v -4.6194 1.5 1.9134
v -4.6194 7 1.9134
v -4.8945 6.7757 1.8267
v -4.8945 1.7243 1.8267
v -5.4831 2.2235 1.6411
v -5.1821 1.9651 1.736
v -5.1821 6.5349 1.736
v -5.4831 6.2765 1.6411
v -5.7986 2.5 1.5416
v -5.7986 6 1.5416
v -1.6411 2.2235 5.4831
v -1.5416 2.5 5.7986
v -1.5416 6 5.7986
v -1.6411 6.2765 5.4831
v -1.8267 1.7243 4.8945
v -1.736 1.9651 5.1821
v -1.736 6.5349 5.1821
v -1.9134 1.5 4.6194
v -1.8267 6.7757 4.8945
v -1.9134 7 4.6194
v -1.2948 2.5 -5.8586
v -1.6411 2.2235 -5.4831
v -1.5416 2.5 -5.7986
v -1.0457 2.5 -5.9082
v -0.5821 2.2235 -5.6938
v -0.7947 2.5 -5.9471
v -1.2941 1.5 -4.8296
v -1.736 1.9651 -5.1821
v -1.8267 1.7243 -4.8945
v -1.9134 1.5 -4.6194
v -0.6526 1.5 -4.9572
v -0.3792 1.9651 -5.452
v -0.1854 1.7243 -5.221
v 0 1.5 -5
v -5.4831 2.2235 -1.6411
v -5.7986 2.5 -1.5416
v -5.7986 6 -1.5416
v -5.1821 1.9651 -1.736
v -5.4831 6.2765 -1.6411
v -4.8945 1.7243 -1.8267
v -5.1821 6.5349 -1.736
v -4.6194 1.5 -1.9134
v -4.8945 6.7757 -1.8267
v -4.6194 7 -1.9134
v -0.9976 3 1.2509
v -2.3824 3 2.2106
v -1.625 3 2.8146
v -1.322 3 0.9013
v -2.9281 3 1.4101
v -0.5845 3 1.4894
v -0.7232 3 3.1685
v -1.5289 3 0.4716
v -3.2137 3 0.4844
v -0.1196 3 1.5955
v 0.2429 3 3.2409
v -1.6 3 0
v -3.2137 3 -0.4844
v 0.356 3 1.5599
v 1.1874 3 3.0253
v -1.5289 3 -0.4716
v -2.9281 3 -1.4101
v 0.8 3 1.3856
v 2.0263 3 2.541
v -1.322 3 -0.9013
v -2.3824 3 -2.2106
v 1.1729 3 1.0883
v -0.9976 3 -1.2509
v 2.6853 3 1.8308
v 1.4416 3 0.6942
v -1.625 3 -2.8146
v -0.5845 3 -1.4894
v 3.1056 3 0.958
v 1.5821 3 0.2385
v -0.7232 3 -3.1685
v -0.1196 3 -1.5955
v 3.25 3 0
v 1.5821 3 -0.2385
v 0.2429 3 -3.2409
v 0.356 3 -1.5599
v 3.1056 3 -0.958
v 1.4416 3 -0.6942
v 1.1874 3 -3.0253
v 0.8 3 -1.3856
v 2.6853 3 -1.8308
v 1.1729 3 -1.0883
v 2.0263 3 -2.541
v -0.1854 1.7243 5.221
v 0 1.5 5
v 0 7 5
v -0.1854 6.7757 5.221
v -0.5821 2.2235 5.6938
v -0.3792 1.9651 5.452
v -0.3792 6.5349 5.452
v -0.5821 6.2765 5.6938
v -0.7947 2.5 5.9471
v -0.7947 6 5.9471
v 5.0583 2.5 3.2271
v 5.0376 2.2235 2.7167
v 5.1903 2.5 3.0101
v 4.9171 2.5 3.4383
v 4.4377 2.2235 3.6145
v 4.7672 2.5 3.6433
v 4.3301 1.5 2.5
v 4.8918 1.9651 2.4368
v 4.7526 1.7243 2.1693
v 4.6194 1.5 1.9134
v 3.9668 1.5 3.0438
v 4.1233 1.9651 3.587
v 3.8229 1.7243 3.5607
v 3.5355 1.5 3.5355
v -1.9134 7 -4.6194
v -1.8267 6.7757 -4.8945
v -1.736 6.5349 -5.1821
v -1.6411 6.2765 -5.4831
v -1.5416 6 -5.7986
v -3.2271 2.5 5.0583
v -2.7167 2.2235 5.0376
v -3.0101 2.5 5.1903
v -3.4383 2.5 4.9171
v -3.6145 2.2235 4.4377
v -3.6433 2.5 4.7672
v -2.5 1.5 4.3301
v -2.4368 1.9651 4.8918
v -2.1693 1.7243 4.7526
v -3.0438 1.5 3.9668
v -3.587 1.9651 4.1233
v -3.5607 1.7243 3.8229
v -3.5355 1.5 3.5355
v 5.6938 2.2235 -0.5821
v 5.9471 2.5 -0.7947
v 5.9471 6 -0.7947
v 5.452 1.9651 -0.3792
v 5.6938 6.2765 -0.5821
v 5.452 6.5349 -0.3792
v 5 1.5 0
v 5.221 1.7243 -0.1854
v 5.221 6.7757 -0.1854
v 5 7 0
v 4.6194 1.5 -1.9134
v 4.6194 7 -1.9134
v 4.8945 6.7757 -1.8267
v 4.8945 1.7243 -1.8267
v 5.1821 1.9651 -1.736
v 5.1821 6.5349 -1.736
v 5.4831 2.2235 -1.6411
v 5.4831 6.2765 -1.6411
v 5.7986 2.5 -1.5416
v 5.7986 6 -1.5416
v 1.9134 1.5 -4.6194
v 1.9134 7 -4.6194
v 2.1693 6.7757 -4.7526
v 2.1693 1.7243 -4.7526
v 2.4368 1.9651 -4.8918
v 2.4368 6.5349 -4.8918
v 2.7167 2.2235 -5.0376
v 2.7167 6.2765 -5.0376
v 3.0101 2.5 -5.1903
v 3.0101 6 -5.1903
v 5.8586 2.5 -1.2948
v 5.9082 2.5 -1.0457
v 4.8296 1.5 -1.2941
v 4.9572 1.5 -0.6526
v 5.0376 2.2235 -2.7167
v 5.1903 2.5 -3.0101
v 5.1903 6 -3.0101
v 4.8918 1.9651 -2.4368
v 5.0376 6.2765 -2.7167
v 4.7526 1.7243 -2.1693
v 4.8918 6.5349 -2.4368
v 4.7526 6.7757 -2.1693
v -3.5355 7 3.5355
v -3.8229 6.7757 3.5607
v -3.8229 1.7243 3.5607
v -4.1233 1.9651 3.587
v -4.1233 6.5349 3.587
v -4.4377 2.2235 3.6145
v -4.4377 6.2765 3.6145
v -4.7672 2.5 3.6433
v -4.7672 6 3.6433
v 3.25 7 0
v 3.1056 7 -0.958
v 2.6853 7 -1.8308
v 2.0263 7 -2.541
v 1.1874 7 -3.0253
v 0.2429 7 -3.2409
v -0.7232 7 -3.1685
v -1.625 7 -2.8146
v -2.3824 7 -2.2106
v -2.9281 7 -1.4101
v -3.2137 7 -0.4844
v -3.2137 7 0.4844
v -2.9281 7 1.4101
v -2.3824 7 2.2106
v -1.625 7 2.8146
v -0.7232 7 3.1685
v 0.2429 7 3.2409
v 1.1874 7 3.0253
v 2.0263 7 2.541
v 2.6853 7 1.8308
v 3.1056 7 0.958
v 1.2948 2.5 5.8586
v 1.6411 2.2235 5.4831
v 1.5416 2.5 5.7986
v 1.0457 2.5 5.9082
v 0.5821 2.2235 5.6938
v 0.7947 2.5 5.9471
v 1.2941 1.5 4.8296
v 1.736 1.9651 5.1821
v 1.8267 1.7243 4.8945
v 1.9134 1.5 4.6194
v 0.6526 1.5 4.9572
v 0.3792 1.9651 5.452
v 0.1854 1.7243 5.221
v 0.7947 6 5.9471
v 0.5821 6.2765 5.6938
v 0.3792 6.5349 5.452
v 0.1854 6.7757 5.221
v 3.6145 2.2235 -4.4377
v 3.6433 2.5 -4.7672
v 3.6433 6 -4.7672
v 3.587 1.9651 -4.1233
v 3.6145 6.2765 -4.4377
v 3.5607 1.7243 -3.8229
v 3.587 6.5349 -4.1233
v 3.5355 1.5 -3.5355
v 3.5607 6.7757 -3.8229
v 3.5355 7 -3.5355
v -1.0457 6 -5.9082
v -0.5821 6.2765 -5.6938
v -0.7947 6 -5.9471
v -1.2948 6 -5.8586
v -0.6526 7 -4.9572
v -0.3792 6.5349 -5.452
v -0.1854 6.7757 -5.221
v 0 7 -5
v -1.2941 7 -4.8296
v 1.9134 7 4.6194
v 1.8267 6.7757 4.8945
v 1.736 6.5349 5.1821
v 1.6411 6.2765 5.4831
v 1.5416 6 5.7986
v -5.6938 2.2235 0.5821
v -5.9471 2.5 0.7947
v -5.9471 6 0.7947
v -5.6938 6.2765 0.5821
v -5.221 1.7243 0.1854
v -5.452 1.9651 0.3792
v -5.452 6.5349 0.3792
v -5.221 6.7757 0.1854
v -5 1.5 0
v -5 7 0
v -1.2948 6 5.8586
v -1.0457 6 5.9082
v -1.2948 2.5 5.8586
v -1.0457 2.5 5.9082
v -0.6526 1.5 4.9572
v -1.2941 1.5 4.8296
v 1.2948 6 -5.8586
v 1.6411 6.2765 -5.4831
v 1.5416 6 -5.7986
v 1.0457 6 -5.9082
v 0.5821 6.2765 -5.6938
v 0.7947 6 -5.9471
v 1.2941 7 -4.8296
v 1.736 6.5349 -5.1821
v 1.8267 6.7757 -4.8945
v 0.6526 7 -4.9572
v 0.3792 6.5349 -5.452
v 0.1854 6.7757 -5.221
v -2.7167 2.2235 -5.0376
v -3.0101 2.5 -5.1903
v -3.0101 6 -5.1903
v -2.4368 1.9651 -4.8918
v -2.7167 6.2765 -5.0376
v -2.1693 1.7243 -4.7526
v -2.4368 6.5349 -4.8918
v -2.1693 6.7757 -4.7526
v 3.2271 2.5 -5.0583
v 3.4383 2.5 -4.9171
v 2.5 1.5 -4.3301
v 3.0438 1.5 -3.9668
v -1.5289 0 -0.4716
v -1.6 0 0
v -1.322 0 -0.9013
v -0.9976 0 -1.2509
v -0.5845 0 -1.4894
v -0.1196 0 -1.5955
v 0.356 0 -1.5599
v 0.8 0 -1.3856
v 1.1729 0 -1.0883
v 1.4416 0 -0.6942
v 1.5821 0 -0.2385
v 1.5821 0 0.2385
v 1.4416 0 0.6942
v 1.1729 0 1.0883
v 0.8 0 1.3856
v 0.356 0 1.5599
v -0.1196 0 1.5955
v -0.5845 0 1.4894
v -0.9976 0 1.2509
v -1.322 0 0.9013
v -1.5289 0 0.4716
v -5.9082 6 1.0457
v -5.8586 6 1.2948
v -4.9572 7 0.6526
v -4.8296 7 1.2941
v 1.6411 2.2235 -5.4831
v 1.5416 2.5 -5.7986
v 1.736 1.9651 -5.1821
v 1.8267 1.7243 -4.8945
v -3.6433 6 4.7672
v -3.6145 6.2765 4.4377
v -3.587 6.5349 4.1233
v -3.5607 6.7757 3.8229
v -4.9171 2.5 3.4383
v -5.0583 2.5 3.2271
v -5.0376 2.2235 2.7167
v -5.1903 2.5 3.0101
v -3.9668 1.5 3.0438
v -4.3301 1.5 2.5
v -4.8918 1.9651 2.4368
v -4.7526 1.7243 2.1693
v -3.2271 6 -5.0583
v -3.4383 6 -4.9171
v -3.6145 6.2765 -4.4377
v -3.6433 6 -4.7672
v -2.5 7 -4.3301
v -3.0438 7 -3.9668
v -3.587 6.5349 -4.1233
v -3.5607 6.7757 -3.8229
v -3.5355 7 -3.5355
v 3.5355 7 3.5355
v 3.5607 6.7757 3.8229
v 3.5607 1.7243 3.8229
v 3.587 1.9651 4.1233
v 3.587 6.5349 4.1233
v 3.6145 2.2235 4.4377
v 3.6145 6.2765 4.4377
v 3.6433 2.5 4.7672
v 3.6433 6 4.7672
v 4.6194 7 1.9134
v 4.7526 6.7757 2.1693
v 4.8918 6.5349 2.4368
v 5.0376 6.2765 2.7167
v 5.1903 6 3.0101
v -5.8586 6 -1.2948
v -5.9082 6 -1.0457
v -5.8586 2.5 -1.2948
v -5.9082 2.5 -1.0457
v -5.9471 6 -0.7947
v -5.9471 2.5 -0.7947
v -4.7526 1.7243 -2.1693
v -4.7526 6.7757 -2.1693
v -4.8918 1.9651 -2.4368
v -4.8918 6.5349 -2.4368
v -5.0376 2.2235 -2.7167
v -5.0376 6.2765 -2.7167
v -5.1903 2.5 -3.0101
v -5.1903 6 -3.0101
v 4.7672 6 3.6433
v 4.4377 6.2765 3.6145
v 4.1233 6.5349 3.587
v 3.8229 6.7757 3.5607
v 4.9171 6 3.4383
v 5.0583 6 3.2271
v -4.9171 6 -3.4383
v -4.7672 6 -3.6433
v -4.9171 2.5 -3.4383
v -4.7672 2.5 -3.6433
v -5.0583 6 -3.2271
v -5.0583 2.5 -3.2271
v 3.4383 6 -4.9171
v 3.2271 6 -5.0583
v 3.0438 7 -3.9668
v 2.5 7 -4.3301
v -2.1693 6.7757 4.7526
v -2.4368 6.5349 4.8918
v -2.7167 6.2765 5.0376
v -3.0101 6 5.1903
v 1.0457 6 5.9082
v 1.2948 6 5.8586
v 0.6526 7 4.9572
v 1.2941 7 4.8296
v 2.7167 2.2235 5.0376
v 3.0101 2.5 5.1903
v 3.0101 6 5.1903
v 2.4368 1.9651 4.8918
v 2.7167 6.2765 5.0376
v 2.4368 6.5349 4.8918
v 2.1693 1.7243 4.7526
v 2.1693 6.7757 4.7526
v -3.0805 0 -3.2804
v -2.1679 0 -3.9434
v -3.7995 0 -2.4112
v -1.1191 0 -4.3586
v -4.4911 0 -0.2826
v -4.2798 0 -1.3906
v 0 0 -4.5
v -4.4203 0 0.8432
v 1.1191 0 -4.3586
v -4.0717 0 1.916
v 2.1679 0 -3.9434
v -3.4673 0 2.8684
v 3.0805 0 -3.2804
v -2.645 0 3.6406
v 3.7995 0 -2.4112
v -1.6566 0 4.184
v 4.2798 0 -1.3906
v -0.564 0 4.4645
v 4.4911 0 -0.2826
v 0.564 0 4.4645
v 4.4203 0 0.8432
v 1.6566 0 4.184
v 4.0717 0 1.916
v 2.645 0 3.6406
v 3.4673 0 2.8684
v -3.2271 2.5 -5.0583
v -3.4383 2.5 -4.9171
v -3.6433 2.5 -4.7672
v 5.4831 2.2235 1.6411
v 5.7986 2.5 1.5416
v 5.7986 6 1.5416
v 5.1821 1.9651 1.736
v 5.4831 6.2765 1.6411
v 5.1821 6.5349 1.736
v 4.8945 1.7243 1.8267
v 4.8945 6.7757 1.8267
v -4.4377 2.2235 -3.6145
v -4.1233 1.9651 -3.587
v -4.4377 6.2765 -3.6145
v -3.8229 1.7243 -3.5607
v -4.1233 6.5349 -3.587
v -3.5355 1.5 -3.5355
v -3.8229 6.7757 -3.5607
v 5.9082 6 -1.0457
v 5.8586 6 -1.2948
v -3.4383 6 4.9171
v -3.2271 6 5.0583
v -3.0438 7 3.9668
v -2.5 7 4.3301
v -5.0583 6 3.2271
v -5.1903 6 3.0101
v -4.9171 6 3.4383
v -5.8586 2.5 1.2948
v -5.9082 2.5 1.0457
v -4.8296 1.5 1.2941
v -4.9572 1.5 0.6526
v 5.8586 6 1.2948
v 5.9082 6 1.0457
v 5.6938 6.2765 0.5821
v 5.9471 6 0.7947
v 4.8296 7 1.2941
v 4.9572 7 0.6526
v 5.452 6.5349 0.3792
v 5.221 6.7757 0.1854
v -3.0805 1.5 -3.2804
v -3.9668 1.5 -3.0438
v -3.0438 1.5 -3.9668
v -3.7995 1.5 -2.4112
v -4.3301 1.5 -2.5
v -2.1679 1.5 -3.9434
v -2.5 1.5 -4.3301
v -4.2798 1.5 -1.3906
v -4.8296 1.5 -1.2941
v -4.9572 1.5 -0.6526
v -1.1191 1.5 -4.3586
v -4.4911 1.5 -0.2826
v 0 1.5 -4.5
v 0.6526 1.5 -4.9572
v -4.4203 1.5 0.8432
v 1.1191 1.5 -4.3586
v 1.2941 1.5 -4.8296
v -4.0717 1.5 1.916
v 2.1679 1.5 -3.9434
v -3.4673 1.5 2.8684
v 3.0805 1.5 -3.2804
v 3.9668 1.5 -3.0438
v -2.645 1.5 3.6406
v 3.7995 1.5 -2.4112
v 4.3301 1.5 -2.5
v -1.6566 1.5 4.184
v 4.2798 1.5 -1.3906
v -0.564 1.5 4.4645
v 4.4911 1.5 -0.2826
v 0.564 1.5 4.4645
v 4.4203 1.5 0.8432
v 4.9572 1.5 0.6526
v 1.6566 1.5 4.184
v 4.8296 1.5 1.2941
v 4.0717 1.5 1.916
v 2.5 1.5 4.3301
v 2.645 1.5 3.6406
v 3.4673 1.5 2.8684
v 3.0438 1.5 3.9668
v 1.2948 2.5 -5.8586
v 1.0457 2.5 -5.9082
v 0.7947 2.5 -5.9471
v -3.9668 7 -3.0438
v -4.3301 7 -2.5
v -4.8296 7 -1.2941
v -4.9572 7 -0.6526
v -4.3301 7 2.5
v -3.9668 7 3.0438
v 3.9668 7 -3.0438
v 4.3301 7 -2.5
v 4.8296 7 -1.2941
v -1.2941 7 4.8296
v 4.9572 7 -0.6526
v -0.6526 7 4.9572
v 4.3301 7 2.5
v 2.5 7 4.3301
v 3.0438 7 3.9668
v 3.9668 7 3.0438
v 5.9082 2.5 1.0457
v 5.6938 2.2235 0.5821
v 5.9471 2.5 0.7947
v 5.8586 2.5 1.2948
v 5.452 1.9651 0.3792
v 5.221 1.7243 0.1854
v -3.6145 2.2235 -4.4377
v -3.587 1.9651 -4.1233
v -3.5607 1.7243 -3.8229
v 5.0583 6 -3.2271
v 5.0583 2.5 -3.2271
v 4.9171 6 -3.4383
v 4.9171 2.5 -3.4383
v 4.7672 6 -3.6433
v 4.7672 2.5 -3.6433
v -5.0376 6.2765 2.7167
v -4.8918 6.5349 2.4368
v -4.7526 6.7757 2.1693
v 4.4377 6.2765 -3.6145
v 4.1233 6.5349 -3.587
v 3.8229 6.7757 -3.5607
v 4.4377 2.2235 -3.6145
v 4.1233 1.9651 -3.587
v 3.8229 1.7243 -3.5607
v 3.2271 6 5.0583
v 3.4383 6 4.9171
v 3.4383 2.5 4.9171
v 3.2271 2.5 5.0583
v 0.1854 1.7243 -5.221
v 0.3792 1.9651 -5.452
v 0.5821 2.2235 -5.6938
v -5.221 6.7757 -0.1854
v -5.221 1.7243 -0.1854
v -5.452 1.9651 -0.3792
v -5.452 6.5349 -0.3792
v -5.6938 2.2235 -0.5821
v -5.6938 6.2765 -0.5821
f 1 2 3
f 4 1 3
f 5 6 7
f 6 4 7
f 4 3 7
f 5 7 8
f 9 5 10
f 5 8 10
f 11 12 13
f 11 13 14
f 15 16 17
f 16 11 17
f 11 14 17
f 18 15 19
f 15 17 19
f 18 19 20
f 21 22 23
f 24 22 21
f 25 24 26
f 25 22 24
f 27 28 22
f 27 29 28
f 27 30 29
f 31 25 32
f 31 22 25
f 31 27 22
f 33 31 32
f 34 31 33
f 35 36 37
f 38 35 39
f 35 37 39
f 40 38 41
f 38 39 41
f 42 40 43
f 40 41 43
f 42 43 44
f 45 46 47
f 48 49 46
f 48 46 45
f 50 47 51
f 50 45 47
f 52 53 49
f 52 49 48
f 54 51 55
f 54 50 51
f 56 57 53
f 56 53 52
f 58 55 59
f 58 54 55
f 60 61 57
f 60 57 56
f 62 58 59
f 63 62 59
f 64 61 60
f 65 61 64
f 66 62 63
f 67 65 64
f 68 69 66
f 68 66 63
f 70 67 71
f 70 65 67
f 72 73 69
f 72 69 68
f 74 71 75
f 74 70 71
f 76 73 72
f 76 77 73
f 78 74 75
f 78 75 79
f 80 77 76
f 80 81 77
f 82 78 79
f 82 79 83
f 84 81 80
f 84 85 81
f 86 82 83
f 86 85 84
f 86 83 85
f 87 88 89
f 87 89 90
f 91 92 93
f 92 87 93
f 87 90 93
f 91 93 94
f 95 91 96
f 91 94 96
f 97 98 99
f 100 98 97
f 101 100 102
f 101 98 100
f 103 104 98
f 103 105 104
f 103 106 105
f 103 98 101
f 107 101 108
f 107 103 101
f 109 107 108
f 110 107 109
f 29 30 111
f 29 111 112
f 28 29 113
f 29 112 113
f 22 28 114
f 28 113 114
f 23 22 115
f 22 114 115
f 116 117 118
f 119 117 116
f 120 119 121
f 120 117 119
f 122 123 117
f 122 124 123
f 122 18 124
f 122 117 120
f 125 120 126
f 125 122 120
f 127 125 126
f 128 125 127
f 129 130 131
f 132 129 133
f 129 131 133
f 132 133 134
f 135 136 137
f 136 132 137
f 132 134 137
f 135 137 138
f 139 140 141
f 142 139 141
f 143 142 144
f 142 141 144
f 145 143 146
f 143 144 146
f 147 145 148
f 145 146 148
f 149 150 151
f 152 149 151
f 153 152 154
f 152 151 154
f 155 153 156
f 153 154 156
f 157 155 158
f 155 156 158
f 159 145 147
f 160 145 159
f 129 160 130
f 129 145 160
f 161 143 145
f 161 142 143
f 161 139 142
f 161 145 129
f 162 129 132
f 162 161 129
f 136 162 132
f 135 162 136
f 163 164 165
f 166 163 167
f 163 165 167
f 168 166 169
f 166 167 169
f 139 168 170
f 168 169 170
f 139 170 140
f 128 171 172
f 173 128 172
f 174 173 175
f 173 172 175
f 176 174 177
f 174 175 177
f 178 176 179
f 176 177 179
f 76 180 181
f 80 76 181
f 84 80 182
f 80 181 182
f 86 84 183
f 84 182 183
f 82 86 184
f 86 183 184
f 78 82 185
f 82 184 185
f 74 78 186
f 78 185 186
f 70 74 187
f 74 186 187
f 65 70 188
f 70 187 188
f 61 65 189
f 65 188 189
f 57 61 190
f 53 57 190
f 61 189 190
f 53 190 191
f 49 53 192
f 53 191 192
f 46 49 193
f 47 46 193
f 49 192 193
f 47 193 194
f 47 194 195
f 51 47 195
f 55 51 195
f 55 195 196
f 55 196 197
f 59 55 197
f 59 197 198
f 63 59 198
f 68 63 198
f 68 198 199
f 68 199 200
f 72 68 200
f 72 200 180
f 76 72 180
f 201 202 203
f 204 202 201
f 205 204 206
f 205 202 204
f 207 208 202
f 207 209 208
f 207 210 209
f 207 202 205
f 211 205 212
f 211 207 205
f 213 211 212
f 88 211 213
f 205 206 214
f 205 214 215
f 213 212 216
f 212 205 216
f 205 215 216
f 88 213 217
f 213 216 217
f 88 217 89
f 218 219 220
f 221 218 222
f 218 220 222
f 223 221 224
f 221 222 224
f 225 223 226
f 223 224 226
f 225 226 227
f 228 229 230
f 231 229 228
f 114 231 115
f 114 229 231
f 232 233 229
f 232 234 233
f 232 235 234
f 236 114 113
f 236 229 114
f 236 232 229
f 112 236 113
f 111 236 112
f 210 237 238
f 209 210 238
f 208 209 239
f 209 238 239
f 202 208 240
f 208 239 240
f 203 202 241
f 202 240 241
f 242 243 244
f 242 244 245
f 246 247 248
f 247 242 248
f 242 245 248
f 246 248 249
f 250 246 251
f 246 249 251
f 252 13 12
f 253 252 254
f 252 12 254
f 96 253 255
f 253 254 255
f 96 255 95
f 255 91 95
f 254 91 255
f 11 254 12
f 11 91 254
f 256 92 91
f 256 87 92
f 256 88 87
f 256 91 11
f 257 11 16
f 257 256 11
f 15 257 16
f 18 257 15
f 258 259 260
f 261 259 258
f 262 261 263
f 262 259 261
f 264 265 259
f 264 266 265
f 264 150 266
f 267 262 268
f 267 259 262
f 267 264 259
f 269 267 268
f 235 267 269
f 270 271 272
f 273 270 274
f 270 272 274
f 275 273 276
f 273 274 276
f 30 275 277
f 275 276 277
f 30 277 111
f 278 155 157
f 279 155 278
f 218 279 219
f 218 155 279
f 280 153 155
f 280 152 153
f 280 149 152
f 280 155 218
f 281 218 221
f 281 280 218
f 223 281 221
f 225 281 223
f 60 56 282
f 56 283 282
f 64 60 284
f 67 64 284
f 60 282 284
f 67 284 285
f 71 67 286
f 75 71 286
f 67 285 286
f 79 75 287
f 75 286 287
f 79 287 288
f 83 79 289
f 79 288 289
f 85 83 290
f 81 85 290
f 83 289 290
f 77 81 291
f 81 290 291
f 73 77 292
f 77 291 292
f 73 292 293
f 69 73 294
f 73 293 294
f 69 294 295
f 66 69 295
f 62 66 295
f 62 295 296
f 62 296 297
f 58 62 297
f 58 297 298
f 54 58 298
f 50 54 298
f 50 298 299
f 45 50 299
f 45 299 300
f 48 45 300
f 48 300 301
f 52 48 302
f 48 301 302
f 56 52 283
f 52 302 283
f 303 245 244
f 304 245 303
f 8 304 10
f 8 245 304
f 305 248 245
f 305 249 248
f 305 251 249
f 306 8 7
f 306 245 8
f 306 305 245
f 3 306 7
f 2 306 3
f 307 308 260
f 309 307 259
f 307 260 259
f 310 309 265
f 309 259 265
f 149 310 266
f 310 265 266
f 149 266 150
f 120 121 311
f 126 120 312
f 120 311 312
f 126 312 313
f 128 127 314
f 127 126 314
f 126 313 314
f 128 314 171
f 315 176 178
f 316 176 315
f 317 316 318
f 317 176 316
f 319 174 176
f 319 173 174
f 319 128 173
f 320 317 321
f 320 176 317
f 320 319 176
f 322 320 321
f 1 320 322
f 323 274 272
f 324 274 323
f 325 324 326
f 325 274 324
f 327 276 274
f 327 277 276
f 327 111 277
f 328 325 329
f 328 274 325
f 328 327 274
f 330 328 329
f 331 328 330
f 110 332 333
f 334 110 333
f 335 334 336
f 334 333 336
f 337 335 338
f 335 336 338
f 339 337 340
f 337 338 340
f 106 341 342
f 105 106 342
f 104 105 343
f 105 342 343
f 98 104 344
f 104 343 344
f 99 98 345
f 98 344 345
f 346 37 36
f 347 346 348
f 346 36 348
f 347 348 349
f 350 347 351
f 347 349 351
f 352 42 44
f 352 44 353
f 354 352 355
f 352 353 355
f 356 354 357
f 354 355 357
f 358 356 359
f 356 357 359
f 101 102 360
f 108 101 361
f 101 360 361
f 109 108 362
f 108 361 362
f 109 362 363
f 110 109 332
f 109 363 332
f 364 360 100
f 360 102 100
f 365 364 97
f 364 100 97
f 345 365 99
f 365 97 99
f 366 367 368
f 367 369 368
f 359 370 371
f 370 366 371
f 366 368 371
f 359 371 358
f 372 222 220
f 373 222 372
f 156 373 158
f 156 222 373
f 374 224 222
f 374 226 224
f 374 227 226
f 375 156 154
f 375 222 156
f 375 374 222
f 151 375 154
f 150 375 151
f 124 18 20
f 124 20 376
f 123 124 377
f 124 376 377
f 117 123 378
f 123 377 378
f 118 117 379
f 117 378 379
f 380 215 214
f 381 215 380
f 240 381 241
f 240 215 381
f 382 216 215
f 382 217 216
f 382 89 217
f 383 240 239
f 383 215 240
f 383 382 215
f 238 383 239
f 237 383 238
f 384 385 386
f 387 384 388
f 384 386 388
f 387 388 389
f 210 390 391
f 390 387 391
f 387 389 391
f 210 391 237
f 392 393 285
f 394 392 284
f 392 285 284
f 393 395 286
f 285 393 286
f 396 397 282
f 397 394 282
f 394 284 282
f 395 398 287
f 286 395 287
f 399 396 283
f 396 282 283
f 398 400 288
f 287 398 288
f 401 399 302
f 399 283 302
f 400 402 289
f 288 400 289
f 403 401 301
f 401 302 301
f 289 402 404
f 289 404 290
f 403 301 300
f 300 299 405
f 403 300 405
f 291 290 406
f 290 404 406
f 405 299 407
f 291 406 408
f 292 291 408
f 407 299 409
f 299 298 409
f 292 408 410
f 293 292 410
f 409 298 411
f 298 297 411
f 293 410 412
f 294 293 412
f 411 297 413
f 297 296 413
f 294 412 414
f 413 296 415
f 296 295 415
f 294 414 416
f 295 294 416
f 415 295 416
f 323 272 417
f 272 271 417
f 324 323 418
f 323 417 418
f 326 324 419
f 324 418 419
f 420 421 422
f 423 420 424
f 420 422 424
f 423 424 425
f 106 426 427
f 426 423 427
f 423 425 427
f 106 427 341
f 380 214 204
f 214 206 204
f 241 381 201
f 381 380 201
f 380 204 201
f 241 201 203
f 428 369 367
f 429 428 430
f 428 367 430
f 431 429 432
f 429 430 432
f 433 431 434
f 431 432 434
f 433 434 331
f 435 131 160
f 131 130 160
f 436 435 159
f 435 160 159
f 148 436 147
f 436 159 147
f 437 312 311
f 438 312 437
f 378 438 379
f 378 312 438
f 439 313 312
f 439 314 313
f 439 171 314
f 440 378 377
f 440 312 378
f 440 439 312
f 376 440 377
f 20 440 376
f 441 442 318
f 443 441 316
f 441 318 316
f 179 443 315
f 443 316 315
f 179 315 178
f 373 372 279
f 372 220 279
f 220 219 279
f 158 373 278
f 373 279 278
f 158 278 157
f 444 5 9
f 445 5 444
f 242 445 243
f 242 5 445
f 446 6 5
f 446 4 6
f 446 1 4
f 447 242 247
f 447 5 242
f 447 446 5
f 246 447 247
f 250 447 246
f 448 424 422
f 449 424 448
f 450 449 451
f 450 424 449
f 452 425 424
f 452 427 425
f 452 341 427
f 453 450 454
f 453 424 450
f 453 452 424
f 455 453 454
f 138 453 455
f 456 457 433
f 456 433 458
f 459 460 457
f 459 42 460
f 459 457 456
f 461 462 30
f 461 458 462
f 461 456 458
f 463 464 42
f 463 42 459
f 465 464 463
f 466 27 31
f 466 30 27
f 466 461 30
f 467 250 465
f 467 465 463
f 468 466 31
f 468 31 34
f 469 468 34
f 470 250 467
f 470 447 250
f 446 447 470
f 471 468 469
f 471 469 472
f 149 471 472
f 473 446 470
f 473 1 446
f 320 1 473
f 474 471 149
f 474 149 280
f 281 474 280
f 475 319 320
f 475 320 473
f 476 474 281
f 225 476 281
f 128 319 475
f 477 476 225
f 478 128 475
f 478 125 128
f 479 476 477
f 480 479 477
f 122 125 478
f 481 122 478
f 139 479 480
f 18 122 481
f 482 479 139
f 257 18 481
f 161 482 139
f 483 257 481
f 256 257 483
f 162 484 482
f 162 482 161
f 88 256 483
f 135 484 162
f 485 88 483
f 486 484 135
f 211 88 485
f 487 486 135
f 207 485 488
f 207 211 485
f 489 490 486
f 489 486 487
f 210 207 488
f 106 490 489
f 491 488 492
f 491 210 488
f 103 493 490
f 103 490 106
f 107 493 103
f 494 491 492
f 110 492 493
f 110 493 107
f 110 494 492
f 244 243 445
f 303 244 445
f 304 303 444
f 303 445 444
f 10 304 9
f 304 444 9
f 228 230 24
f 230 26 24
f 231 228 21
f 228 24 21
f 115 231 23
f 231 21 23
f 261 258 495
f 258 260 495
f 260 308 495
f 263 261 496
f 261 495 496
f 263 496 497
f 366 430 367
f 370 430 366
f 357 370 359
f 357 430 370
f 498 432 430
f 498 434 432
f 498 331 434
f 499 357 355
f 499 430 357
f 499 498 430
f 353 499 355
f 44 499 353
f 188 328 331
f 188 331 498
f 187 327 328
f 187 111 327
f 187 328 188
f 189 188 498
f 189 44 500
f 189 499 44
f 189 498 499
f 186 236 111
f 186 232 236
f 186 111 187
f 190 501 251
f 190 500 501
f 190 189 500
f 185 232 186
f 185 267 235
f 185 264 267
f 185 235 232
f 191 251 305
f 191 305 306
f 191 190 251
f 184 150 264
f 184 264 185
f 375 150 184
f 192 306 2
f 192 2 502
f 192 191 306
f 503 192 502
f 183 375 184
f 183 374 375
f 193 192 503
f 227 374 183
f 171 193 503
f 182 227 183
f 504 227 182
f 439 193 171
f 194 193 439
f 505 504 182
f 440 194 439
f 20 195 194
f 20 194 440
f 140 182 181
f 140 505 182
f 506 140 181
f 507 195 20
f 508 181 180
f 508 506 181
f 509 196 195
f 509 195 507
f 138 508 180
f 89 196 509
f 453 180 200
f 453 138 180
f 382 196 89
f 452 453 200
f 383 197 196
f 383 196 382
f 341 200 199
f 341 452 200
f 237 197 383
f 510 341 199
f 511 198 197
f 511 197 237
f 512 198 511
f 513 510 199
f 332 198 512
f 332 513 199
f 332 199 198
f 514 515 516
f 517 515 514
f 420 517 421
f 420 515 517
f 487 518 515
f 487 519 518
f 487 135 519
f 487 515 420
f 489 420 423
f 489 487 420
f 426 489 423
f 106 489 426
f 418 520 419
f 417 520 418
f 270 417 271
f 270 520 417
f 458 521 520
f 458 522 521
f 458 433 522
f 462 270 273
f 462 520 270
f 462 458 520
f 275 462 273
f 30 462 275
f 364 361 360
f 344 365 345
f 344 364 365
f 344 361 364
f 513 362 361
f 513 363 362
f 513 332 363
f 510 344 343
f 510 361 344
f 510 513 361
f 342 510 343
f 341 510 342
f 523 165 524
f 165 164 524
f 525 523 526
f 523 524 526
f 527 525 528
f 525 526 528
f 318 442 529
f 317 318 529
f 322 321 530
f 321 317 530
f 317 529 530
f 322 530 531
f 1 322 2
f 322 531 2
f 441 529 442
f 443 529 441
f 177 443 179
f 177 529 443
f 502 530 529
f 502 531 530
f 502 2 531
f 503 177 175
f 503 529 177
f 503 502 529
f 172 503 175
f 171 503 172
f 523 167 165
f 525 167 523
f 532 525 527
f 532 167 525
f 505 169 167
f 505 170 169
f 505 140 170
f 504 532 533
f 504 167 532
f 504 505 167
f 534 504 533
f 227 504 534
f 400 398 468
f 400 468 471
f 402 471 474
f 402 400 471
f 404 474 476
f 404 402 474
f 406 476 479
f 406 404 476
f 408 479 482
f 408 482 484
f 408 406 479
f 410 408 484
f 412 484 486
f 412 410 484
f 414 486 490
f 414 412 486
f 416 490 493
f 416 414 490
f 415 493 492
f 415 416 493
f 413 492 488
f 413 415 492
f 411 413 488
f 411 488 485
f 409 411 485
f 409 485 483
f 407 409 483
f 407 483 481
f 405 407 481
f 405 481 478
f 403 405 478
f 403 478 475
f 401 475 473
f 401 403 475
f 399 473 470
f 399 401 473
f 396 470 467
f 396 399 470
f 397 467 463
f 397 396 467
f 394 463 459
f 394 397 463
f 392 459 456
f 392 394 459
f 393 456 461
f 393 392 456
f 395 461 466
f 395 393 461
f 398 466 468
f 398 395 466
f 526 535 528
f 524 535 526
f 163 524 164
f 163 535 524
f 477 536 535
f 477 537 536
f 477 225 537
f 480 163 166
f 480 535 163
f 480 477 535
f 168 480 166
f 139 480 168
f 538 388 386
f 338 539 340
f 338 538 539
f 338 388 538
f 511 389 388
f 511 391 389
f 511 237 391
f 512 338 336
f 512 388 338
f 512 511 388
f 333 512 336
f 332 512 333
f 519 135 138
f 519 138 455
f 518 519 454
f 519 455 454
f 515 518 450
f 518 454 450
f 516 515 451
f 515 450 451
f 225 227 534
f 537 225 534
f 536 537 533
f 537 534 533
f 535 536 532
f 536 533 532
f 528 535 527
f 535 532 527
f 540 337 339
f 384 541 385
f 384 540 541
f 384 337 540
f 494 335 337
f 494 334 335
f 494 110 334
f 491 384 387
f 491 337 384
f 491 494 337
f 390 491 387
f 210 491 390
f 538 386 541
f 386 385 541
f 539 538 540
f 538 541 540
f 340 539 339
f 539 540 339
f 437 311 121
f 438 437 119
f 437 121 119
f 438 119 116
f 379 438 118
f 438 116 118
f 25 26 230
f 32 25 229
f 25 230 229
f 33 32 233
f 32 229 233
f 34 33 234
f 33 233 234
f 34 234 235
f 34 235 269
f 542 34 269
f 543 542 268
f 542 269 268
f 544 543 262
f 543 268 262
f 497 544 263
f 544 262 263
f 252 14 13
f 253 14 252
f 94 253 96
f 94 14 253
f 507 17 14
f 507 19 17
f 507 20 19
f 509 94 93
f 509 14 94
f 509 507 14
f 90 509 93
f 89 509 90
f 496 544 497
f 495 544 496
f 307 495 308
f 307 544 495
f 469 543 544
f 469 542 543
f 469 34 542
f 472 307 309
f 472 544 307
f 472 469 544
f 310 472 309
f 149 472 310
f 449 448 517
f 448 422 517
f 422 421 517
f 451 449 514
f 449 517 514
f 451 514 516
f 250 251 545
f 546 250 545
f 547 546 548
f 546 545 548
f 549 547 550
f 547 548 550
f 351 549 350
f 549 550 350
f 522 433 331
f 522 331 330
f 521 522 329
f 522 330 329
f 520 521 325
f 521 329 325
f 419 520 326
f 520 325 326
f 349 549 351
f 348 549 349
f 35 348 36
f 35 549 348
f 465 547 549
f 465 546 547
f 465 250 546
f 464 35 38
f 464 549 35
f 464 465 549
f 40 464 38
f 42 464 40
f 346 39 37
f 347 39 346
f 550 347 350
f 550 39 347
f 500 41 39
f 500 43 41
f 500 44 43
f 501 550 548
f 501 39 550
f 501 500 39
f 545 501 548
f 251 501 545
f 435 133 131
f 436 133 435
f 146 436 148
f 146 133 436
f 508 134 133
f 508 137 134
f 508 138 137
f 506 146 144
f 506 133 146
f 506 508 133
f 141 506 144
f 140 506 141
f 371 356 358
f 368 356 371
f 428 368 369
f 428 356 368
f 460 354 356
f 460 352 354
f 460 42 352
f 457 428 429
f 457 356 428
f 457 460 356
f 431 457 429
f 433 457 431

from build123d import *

# Parameters (mm, degrees)
ESQUISSE1_R                                     = 6
BOSS_EXTRU_1_DEPTH                              = 7
ESQUISSE2_OUTSIDE_W                             = 17.672
ESQUISSE2_OUTSIDE_H                             = 17.672
ESQUISSE2_OUTSIDE_R                             = 4.5
ENL_V_MAT_EXTRU_1_DEPTH                         = 1.5
CHANFREIN1_SIZE                                 = 1
CHAMBRAGE_POUR_VIS_T_TE_CYLINDRIQUE_D           = 3.2
CHAMBRAGE_POUR_VIS_T_TE_CYLINDRIQUE_CBORE_D     = 6.5
CHAMBRAGE_POUR_VIS_T_TE_CYLINDRIQUE_CBORE_DEPTH = 4
ENL_V_MAT_EXTRU_2_DEPTH                         = 12
R_P_TITION_CIRCULAIRE1_COUNT                    = 16


with BuildPart() as part:
    # Esquisse1 → Boss.-Extru.1 (new body)
    with BuildSketch(Plane(origin=(0, 0, 0), x_dir=(1, 0, 0), z_dir=(0, 1, 0))):
        with Locations(Location((0, 0, 0), (0, 0, 270))):
            Circle(ESQUISSE1_R)
    extrude(amount=BOSS_EXTRU_1_DEPTH)

    # Esquisse2 outside → Enlèv. mat.-Extru.1 (cut)
    with BuildSketch(Plane.XZ):
        Rectangle(ESQUISSE2_OUTSIDE_W, ESQUISSE2_OUTSIDE_H)
        with Locations(Location((0, 0, 0), (0, 0, 270))):
            Circle(ESQUISSE2_OUTSIDE_R, mode=Mode.SUBTRACT)
    extrude(amount=-ENL_V_MAT_EXTRU_1_DEPTH, mode=Mode.SUBTRACT)

    # Chanfrein1
    chanfrein1_edges = [part.edges().sort_by_distance(p)[0] for p in [
        (0, 7, -6),
        (0, 1.5, -6),
    ]]
    chamfer(chanfrein1_edges, length=CHANFREIN1_SIZE)

    # Chambrage pour vis à tête cylindrique à 6 pans creux (ou vis CHC) M31 (through all)
    with Locations(Plane(origin=(0, 7, 0), x_dir=(1, 0, 0), z_dir=(0, 1, 0))):
        with Locations((0, 0)):
            CounterBoreHole(CHAMBRAGE_POUR_VIS_T_TE_CYLINDRIQUE_D / 2, CHAMBRAGE_POUR_VIS_T_TE_CYLINDRIQUE_CBORE_D / 2, CHAMBRAGE_POUR_VIS_T_TE_CYLINDRIQUE_CBORE_DEPTH)

    # Esquisse5 → Enlèv. mat.-Extru.2 (cut, through all)
    with BuildSketch(Plane(origin=(0, 7, 0), x_dir=(1, 0, 0), z_dir=(0, 1, 0))):
        Polygon((-5, 0), (-6.645642825, 1.380858287), (-6.645642825, -1.380858287), align=None)
    enl_v_mat_extru_2 = extrude(amount=-ENL_V_MAT_EXTRU_2_DEPTH, mode=Mode.SUBTRACT)

    # Répétition circulaire1: Enlèv. mat.-Extru.2 ×16 about axis
    r_p_tition_circulaire1_axis = Axis((0, 0, 0), (0, 1, 0))
    for i in range(1, R_P_TITION_CIRCULAIRE1_COUNT):
        add(enl_v_mat_extru_2.rotate(r_p_tition_circulaire1_axis, i * 360 / R_P_TITION_CIRCULAIRE1_COUNT), mode=Mode.SUBTRACT)


solid = part.part
